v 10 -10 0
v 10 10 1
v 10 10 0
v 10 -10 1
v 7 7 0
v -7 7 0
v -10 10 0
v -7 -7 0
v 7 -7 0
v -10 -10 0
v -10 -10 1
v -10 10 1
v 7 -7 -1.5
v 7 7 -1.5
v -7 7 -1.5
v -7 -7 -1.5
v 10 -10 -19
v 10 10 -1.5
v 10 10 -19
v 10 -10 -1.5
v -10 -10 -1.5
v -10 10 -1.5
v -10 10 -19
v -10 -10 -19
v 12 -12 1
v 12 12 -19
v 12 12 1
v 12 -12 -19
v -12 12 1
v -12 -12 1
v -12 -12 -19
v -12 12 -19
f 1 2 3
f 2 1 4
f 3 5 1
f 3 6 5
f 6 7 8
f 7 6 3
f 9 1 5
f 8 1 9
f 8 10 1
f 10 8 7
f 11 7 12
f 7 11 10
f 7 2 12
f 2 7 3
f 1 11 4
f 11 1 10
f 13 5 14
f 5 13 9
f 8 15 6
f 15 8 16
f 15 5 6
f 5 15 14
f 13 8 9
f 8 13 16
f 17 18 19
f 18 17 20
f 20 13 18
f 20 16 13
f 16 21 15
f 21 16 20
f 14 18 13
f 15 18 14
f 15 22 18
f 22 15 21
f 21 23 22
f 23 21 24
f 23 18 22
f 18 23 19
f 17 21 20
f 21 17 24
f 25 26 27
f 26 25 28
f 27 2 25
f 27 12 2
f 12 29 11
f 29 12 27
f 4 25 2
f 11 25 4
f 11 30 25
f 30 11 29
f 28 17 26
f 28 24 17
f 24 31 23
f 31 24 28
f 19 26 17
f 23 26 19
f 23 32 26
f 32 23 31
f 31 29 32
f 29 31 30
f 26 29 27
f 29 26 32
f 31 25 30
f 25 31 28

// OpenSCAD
// Generated by SolidPython 1.1.3 on 2024-12-14 22:48:31


difference() {
	translate(v = [-12, -12, -19]) {
		cube(size = [24, 24, 20]);
	}
	union() {
		translate(v = [-10, -10, 0]) {
			cube(size = [20, 20, 10]);
		}
		translate(v = [-7, -7, -49]) {
			cube(size = [14, 14, 50]);
		}
		translate(v = [-10, -10, -51.5000000000]) {
			cube(size = [20, 20, 50]);
		}
	}
}
/***********************************************
*********      SolidPython code:      **********
************************************************
 
from solid import *

# ケースになる部分
body = translate([-12, -12, -19])(
    cube([24, 24, 20])
)

# ケースからカットする部分
hole = union()(
    # スイッチの上側をカットする部分
    translate([-10, -10, 0])(
        cube([20, 20, 10])
    ),
    # スイッチの穴
    translate([-7, -7, -49])(
        cube([14, 14, 50])
    ),
    # スイッチプレートの下側
    translate([-10, -10, -51.5])(
        cube([20, 20, 50])
    ),
)

kbd = difference()(
    body,
    hole
)

scad_render_to_file(kbd, '3_1key.scad')
 
 
************************************************/
